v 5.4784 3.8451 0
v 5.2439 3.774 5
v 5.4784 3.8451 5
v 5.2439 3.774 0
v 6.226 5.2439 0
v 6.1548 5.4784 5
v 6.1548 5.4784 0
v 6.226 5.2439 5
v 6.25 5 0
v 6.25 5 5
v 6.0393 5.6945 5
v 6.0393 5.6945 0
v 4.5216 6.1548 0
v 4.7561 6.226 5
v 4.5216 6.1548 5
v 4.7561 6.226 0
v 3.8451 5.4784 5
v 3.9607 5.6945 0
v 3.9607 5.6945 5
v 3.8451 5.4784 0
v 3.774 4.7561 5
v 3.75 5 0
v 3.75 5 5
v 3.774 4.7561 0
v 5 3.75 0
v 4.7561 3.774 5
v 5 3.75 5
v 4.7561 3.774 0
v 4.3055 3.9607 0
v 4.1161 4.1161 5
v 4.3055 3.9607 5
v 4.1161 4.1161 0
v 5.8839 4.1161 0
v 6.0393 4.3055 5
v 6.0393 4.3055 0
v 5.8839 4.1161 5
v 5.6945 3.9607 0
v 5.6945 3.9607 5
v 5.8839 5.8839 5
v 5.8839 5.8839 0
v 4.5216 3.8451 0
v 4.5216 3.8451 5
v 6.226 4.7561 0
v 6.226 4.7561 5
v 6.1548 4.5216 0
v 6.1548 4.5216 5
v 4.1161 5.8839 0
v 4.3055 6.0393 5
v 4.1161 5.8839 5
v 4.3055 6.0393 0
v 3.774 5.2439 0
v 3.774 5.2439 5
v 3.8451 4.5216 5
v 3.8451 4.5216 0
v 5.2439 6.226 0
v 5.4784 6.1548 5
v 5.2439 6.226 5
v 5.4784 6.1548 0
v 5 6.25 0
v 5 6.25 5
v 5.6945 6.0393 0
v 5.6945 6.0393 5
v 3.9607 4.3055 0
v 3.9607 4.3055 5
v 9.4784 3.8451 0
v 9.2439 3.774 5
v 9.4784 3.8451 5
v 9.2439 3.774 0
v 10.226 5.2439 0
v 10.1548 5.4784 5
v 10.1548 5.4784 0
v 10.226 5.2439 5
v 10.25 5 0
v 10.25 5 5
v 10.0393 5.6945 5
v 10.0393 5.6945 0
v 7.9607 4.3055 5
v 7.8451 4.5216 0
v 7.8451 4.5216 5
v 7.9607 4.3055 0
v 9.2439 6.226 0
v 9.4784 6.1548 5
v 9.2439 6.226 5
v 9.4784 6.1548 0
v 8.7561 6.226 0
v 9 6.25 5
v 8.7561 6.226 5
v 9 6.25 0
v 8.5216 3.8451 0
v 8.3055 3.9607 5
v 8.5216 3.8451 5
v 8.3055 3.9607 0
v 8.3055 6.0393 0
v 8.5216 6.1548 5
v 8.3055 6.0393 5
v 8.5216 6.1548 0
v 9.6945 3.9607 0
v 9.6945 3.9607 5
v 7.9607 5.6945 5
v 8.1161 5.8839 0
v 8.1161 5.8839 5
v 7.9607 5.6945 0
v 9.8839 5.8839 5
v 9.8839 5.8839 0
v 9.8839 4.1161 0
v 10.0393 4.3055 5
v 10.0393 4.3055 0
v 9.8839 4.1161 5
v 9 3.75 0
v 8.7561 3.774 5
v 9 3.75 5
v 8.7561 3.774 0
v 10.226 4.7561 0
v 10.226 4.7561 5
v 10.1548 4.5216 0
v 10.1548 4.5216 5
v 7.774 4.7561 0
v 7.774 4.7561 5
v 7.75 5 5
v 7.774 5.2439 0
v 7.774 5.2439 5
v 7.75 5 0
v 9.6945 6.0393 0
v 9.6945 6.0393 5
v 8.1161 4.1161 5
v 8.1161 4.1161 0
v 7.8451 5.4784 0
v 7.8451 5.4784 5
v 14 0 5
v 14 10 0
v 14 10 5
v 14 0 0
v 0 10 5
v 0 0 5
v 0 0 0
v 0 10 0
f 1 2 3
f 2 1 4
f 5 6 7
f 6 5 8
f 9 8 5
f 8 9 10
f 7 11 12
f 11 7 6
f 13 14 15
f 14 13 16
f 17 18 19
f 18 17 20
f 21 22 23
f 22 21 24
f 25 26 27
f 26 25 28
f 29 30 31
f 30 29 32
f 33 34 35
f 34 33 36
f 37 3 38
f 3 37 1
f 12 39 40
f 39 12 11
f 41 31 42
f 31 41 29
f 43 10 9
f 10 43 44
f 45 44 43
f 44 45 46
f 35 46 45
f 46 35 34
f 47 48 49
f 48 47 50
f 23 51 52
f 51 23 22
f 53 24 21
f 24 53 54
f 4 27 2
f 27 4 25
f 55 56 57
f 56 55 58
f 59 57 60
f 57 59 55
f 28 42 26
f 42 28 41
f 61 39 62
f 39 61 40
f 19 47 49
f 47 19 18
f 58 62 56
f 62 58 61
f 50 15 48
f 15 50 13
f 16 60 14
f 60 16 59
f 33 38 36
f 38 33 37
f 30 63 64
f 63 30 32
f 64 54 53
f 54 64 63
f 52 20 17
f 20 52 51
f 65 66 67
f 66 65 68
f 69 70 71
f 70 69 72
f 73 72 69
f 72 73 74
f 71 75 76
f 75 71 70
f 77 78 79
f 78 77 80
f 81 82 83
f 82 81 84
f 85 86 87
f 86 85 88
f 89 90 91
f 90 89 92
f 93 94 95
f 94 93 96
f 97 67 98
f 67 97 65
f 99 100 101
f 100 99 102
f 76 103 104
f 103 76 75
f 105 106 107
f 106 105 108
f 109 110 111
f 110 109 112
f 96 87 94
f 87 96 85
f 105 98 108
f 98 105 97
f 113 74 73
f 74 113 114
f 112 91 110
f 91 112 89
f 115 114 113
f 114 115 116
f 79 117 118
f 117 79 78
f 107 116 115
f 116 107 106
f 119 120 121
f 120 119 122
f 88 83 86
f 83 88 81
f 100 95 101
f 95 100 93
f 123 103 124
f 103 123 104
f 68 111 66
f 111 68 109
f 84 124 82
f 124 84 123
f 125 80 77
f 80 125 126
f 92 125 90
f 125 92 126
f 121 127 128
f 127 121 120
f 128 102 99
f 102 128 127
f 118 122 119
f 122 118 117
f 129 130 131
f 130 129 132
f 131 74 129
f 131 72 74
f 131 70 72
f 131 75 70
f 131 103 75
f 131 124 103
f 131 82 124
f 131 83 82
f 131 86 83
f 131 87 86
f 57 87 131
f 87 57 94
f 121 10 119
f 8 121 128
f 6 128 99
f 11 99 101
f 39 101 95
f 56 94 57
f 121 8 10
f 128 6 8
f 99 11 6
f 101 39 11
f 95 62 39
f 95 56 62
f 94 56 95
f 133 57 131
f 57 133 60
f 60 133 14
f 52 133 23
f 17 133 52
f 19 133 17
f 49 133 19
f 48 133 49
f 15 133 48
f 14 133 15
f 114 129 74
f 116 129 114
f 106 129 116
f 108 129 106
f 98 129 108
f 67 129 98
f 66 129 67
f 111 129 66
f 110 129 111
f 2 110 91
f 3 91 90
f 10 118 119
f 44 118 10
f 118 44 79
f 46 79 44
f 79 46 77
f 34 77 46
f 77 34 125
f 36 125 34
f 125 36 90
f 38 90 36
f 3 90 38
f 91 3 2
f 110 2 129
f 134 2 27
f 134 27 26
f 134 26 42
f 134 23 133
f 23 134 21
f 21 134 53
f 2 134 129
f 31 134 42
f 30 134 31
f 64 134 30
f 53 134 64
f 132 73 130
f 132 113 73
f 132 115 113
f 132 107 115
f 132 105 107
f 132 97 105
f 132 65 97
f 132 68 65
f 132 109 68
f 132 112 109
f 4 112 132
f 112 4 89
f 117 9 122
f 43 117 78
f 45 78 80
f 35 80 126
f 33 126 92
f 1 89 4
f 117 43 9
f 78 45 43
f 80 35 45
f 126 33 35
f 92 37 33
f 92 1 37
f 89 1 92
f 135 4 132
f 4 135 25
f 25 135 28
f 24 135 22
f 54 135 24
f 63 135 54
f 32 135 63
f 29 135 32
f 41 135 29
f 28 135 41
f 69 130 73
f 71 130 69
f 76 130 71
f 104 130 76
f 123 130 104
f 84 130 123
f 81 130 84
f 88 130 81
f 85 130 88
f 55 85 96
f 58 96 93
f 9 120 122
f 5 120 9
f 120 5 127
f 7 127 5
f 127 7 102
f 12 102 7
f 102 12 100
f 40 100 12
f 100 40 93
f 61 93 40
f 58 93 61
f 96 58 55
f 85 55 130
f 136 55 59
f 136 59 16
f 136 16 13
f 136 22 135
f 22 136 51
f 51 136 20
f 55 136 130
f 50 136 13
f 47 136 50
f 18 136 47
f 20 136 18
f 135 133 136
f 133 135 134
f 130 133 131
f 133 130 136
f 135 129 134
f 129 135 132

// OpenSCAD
$fn = 32;

// ----------------------------------------------------------------------
// Micro pad: two-hole pad, 5-20 mm class
// ----------------------------------------------------------------------

// --- parameters (mm) ---
pad_l = 14;               // pad length, X
pad_w = 10;               // pad width, Y
pad_t = 5;                // pad thickness, Z
hole_d = 2.5;             // hole diameter
hole_x = 5;               // X of the first hole centre

difference() {
  cube([pad_l, pad_w, pad_t]);
  for (x = [hole_x, pad_l - hole_x])
    translate([x, pad_w / 2, -1])
      cylinder(h = pad_t + 2, d = hole_d);
}
